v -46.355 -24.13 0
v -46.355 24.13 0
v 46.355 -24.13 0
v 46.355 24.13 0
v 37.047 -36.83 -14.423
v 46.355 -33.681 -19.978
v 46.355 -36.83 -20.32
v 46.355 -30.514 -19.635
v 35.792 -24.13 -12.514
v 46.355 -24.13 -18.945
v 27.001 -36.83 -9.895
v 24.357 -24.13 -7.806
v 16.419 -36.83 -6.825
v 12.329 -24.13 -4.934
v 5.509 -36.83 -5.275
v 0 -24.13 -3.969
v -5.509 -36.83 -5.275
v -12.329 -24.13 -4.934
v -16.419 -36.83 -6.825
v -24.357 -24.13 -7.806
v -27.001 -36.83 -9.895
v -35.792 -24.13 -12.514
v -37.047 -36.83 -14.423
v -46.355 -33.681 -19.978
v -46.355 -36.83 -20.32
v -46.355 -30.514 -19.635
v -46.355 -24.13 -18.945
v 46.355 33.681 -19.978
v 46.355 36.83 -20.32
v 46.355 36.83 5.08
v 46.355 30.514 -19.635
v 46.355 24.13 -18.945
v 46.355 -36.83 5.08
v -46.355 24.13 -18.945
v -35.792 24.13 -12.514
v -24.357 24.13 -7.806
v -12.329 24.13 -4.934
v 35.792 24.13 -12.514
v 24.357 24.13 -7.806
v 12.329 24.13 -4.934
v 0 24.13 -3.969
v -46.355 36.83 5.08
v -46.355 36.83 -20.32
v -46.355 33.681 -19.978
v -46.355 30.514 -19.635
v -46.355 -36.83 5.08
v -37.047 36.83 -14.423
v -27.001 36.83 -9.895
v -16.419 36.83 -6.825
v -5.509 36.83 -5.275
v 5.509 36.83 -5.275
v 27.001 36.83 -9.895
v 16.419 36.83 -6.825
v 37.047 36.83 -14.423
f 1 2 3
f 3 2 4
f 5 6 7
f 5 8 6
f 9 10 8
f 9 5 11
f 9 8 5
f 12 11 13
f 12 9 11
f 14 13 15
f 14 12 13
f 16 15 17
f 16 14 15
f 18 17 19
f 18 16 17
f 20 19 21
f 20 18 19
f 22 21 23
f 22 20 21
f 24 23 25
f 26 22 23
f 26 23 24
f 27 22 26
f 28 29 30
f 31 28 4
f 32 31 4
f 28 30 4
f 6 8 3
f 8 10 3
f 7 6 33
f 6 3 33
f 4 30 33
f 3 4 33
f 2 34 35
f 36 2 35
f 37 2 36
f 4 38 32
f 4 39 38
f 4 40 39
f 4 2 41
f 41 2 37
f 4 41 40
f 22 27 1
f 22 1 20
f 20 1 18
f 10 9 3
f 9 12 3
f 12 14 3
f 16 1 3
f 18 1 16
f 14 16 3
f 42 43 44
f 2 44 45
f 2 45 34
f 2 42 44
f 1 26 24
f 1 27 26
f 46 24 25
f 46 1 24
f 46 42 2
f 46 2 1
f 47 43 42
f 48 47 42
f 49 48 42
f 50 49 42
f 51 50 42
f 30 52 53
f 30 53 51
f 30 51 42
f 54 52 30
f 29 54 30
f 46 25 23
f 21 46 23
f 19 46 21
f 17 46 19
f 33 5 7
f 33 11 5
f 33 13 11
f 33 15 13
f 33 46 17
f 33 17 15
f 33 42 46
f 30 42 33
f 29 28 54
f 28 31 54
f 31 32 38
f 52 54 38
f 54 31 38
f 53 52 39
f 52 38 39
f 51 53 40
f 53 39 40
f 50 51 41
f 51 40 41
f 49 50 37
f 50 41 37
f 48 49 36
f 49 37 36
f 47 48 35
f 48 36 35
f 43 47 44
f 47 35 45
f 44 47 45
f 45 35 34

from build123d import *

# Parameters (mm, degrees)
F0_W       = 92.71
F0_H       = 73.66
F1_DEPTH   = 5.08
F2_W       = 92.71
F2_H       = 12.7
F3_DEPTH   = 20.32
F5_DEPTH   = 73.661
F6_SIZE2   = 1.111096
F6_SIZE    = 12.69999
F6_2_SIZE2 = 1.111096
F6_2_SIZE  = 12.69999


# Not quite as in the source:
# - a fillet or chamfer is up to 0.001 mm smaller than in the source, because OpenCascade refuses the exact size


with BuildPart() as f1:
    # F0 (on Top) → F1 (new body)
    with BuildSketch(Plane.XY):
        Rectangle(F0_W, F0_H)
    extrude(amount=F1_DEPTH)

    # F2 (on face) → F3 (join)
    with BuildSketch(Plane(origin=(0, 0, 0), x_dir=(1, 0, 0), z_dir=(0, 0, -1))):
        with Locations((0, 30.48)):
            Rectangle(F2_W, F2_H)
        with Locations((0, -30.48)):
            Rectangle(F2_W, F2_H)
    extrude(amount=F3_DEPTH)

    # F4 (on face) → F5 (cut, through all)
    with BuildSketch(Plane.XZ.offset(36.83)):
        with BuildLine():
            Line((-46.355, -20.32), (46.355, -20.32))
            ThreePointArc((46.355, -20.32), (0, -5.08), (-46.355, -20.32))
        make_face()
    extrude(amount=-F5_DEPTH, mode=Mode.SUBTRACT)

    # F6 (size 12.7 and 1.1111060268 in the source; OpenCascade refuses exactly that, so slightly less here)
    f6_edges = [f1.edges().sort_by_distance(p)[0] for p in [
        (0, 24.13, -5.08),
    ]]
    f6_side = f1.faces().sort_by_distance((0, 30.48, -5.08))[0]
    chamfer(f6_edges, length=F6_SIZE, length2=F6_SIZE2, reference=f6_side)

    # F6#2 (size 12.7 and 1.1111060268 in the source; OpenCascade refuses exactly that, so slightly less here)
    f6_2_edges = [f1.edges().sort_by_distance(p)[0] for p in [
        (0, -24.13, -5.08),
    ]]
    f6_2_side = f1.faces().sort_by_distance((0, -30.48, -5.08))[0]
    chamfer(f6_2_edges, length=F6_2_SIZE, length2=F6_2_SIZE2, reference=f6_2_side)


solid = f1.part
